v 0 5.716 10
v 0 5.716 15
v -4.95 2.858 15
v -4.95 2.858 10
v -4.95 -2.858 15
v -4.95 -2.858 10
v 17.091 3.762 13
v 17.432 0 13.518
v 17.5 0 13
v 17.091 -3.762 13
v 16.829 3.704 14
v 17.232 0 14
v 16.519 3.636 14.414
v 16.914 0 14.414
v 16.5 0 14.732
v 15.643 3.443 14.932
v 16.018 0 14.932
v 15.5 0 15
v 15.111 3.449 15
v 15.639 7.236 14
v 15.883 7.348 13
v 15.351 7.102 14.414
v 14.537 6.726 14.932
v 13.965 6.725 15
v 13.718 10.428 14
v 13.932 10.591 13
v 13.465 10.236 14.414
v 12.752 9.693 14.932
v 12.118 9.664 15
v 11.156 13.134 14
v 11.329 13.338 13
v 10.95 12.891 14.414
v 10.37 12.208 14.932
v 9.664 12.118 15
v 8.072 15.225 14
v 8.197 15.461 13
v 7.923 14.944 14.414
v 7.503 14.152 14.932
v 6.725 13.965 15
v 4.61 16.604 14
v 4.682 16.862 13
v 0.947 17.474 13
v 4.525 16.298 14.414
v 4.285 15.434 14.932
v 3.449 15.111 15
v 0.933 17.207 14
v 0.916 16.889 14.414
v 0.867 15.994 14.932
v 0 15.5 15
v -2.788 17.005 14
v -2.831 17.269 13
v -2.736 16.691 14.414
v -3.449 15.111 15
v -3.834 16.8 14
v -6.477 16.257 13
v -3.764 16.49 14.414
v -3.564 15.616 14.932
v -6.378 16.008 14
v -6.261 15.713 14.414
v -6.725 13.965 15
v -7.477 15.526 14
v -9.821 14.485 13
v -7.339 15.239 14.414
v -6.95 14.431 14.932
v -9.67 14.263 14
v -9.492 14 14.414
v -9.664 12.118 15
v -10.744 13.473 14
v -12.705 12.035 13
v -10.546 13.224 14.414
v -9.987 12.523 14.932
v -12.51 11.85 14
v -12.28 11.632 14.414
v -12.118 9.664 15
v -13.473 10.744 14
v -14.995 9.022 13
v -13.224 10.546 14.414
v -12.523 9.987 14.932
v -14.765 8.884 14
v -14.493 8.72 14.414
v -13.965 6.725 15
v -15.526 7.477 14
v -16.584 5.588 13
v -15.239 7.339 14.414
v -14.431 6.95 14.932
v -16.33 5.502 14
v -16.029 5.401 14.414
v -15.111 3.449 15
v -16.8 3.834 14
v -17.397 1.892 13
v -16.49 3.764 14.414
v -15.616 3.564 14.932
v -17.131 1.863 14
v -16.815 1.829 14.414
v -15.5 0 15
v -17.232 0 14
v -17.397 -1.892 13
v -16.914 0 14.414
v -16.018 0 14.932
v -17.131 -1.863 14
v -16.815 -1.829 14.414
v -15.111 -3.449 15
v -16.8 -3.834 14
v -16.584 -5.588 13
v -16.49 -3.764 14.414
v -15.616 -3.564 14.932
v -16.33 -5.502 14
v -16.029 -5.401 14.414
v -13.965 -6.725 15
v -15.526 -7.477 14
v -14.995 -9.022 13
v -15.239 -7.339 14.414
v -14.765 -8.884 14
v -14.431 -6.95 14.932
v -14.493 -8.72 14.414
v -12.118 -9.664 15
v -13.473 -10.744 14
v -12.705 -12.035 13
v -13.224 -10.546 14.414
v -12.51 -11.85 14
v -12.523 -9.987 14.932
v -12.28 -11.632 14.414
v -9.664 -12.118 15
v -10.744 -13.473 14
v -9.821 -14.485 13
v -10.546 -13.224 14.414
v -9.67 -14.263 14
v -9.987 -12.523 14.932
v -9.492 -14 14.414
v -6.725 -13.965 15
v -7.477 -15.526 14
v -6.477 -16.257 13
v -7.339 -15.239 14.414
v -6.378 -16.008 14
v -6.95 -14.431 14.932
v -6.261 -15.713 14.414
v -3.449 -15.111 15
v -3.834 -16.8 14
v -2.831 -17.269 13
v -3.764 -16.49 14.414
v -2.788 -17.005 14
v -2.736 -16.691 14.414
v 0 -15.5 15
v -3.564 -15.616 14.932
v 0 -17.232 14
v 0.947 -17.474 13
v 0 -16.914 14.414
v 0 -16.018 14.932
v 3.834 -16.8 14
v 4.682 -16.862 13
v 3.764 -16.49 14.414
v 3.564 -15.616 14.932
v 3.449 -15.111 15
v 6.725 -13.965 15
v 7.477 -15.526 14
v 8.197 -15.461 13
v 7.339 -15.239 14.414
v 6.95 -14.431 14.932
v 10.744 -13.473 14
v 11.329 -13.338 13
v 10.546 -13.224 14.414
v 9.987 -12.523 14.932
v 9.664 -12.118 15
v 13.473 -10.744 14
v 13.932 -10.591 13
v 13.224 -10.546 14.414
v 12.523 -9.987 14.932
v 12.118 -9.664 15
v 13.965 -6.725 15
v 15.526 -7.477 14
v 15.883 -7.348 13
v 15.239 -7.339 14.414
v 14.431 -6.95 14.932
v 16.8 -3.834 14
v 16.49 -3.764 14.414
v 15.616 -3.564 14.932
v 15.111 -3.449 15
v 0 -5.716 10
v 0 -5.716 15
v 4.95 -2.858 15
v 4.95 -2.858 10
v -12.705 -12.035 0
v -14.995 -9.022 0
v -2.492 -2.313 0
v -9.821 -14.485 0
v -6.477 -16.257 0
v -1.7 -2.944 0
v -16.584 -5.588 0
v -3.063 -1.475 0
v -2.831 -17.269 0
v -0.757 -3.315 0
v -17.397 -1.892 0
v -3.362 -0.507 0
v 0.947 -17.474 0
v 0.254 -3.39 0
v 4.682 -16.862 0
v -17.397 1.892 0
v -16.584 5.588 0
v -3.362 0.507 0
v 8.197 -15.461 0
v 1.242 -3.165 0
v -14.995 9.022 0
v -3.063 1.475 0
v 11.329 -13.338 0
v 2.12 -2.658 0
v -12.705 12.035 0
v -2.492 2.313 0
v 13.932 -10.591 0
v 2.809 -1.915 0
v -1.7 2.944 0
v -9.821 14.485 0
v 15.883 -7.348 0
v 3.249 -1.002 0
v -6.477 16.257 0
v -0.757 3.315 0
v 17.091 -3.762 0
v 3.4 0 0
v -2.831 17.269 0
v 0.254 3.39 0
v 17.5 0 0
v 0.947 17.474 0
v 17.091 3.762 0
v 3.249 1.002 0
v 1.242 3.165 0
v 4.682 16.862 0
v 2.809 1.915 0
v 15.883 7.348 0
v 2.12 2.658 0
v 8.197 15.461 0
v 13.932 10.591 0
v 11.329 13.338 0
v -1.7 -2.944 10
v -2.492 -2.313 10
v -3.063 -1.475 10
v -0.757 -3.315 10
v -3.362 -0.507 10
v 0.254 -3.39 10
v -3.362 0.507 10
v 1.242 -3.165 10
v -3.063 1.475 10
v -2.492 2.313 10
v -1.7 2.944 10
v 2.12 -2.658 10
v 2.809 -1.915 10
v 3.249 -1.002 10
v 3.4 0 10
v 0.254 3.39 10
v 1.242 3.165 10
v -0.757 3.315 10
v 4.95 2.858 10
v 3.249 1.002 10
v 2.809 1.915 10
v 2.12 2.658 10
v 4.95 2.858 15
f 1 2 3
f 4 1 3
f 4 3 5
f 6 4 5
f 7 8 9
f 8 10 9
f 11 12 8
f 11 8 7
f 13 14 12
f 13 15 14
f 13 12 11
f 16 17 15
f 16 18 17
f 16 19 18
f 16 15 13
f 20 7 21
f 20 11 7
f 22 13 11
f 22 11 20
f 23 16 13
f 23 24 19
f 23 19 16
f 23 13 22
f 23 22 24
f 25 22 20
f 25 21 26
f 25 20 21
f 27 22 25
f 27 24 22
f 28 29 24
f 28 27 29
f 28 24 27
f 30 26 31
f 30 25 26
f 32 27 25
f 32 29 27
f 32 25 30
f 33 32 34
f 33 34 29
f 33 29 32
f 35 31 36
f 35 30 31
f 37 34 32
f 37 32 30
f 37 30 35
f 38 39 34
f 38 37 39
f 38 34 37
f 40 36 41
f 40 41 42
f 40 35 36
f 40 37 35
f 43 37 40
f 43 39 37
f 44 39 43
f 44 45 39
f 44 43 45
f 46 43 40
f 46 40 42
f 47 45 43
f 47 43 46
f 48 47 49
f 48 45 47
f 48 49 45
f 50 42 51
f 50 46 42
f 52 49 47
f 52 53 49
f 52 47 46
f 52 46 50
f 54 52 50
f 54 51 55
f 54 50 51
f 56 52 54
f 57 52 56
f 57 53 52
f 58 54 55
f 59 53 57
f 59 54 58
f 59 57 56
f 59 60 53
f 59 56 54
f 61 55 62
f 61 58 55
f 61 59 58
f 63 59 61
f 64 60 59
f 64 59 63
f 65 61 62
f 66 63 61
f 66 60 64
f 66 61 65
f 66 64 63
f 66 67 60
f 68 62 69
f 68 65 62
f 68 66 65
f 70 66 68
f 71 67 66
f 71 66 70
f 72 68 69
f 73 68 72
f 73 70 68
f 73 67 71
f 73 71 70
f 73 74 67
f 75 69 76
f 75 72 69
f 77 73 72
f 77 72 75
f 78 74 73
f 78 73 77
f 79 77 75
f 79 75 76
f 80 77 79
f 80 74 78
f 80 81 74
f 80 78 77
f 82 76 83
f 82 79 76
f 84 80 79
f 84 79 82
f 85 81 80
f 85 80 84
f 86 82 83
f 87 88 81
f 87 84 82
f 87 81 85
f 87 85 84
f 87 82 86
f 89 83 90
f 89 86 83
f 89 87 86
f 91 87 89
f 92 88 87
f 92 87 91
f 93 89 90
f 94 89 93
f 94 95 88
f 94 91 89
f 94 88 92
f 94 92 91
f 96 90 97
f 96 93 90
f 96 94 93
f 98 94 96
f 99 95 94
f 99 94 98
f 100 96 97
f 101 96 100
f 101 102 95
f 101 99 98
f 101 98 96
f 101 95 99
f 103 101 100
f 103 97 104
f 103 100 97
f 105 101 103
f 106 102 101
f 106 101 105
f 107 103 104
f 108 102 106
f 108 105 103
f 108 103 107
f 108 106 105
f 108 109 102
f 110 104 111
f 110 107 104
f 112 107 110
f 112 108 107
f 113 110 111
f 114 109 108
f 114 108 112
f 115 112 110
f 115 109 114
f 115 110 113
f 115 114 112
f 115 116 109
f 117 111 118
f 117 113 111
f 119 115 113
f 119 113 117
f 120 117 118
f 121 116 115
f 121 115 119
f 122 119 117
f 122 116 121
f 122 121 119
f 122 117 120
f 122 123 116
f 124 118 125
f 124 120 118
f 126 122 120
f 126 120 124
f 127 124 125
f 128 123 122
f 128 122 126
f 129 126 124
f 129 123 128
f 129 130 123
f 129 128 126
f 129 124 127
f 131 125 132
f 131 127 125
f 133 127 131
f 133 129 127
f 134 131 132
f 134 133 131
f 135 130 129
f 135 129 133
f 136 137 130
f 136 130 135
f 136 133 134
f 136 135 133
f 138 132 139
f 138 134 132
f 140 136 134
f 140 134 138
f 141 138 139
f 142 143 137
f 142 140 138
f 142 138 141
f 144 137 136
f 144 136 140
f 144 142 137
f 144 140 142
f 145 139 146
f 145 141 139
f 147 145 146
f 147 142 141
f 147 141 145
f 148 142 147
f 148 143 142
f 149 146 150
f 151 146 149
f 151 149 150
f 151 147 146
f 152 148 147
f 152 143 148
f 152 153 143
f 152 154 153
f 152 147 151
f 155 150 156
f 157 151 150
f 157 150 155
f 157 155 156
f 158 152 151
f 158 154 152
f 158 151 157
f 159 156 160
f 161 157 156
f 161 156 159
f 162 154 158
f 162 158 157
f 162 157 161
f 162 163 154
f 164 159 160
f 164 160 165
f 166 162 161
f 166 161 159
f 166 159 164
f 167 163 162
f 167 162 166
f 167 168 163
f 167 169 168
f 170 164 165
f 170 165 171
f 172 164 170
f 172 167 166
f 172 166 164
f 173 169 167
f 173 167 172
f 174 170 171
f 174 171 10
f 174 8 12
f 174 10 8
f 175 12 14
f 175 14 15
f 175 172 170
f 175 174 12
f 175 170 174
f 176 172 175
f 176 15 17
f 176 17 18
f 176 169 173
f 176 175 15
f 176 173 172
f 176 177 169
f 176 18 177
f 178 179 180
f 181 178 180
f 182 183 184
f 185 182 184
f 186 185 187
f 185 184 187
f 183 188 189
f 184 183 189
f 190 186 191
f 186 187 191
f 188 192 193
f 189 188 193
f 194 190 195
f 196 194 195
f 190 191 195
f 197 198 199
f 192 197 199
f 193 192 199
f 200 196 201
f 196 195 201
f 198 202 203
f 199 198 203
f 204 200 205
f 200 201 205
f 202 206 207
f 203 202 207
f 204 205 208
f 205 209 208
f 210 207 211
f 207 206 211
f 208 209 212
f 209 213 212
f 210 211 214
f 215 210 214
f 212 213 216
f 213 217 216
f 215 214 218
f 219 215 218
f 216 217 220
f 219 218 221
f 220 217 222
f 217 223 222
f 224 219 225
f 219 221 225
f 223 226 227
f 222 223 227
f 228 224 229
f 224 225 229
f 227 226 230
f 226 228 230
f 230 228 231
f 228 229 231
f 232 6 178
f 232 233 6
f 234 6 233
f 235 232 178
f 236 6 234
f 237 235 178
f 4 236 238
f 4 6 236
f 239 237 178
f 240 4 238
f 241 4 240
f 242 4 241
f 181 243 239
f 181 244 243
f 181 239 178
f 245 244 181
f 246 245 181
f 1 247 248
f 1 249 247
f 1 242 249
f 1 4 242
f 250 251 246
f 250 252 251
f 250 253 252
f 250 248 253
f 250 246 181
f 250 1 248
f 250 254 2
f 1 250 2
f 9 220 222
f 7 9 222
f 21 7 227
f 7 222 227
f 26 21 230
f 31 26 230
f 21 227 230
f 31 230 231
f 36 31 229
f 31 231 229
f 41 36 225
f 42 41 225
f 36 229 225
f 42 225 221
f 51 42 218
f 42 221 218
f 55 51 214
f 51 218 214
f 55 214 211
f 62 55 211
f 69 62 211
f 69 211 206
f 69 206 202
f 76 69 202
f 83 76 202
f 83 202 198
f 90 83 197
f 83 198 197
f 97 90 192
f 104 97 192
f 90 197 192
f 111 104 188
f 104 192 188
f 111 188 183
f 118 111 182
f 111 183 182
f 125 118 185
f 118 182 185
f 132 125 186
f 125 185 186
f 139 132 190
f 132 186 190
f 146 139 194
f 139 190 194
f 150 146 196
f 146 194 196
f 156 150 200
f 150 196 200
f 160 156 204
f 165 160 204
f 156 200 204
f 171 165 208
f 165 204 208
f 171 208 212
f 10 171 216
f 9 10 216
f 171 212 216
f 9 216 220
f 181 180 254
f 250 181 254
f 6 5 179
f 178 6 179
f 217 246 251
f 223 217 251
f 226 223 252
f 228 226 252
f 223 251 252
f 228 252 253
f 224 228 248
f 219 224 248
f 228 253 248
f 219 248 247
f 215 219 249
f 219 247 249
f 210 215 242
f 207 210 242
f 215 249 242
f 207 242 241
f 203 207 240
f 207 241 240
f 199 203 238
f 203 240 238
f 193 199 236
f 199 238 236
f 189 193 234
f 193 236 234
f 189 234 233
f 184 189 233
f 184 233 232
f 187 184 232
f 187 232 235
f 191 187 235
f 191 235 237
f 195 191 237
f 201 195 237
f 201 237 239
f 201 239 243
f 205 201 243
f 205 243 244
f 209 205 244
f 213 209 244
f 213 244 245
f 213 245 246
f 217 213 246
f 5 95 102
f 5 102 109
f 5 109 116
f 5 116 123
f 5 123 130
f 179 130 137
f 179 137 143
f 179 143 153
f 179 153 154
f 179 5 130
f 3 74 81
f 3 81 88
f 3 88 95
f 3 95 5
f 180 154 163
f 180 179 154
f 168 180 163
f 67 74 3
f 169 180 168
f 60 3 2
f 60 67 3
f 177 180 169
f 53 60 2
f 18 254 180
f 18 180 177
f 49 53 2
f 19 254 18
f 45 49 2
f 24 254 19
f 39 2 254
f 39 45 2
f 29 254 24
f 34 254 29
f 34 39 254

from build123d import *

# Parameters (mm, degrees)
F0_R     = 17.5
F1_DEPTH = 15
F3_DEPTH = 5
F4_R     = 2
F5_R     = 3.4
F6_DEPTH = 10.001


with BuildPart() as f1:
    # F0 (on Top) → F1 (new body)
    with BuildSketch(Plane.XY):
        Circle(F0_R)
    extrude(amount=F1_DEPTH)

    # F2 (on face) → F3 (cut)
    with BuildSketch(Plane.XY.offset(15)):
        Polygon((0, -5.715768), (4.95, -2.857884), (4.95, 2.857884), (0, 5.715768), (-4.95, 2.857884), (-4.95, -2.857884), align=None)
    extrude(amount=-F3_DEPTH, mode=Mode.SUBTRACT)

    # F4
    f4_edges = [f1.edges().sort_by_distance(p)[0] for p in [
        (-17.5, 0, 15),
    ]]
    fillet(f4_edges, radius=F4_R)

    # F5 (on face) → F6 (cut, through all)
    with BuildSketch(Plane.XY.offset(10)):
        Circle(F5_R)
    extrude(amount=-F6_DEPTH, mode=Mode.SUBTRACT)


solid = f1.part
